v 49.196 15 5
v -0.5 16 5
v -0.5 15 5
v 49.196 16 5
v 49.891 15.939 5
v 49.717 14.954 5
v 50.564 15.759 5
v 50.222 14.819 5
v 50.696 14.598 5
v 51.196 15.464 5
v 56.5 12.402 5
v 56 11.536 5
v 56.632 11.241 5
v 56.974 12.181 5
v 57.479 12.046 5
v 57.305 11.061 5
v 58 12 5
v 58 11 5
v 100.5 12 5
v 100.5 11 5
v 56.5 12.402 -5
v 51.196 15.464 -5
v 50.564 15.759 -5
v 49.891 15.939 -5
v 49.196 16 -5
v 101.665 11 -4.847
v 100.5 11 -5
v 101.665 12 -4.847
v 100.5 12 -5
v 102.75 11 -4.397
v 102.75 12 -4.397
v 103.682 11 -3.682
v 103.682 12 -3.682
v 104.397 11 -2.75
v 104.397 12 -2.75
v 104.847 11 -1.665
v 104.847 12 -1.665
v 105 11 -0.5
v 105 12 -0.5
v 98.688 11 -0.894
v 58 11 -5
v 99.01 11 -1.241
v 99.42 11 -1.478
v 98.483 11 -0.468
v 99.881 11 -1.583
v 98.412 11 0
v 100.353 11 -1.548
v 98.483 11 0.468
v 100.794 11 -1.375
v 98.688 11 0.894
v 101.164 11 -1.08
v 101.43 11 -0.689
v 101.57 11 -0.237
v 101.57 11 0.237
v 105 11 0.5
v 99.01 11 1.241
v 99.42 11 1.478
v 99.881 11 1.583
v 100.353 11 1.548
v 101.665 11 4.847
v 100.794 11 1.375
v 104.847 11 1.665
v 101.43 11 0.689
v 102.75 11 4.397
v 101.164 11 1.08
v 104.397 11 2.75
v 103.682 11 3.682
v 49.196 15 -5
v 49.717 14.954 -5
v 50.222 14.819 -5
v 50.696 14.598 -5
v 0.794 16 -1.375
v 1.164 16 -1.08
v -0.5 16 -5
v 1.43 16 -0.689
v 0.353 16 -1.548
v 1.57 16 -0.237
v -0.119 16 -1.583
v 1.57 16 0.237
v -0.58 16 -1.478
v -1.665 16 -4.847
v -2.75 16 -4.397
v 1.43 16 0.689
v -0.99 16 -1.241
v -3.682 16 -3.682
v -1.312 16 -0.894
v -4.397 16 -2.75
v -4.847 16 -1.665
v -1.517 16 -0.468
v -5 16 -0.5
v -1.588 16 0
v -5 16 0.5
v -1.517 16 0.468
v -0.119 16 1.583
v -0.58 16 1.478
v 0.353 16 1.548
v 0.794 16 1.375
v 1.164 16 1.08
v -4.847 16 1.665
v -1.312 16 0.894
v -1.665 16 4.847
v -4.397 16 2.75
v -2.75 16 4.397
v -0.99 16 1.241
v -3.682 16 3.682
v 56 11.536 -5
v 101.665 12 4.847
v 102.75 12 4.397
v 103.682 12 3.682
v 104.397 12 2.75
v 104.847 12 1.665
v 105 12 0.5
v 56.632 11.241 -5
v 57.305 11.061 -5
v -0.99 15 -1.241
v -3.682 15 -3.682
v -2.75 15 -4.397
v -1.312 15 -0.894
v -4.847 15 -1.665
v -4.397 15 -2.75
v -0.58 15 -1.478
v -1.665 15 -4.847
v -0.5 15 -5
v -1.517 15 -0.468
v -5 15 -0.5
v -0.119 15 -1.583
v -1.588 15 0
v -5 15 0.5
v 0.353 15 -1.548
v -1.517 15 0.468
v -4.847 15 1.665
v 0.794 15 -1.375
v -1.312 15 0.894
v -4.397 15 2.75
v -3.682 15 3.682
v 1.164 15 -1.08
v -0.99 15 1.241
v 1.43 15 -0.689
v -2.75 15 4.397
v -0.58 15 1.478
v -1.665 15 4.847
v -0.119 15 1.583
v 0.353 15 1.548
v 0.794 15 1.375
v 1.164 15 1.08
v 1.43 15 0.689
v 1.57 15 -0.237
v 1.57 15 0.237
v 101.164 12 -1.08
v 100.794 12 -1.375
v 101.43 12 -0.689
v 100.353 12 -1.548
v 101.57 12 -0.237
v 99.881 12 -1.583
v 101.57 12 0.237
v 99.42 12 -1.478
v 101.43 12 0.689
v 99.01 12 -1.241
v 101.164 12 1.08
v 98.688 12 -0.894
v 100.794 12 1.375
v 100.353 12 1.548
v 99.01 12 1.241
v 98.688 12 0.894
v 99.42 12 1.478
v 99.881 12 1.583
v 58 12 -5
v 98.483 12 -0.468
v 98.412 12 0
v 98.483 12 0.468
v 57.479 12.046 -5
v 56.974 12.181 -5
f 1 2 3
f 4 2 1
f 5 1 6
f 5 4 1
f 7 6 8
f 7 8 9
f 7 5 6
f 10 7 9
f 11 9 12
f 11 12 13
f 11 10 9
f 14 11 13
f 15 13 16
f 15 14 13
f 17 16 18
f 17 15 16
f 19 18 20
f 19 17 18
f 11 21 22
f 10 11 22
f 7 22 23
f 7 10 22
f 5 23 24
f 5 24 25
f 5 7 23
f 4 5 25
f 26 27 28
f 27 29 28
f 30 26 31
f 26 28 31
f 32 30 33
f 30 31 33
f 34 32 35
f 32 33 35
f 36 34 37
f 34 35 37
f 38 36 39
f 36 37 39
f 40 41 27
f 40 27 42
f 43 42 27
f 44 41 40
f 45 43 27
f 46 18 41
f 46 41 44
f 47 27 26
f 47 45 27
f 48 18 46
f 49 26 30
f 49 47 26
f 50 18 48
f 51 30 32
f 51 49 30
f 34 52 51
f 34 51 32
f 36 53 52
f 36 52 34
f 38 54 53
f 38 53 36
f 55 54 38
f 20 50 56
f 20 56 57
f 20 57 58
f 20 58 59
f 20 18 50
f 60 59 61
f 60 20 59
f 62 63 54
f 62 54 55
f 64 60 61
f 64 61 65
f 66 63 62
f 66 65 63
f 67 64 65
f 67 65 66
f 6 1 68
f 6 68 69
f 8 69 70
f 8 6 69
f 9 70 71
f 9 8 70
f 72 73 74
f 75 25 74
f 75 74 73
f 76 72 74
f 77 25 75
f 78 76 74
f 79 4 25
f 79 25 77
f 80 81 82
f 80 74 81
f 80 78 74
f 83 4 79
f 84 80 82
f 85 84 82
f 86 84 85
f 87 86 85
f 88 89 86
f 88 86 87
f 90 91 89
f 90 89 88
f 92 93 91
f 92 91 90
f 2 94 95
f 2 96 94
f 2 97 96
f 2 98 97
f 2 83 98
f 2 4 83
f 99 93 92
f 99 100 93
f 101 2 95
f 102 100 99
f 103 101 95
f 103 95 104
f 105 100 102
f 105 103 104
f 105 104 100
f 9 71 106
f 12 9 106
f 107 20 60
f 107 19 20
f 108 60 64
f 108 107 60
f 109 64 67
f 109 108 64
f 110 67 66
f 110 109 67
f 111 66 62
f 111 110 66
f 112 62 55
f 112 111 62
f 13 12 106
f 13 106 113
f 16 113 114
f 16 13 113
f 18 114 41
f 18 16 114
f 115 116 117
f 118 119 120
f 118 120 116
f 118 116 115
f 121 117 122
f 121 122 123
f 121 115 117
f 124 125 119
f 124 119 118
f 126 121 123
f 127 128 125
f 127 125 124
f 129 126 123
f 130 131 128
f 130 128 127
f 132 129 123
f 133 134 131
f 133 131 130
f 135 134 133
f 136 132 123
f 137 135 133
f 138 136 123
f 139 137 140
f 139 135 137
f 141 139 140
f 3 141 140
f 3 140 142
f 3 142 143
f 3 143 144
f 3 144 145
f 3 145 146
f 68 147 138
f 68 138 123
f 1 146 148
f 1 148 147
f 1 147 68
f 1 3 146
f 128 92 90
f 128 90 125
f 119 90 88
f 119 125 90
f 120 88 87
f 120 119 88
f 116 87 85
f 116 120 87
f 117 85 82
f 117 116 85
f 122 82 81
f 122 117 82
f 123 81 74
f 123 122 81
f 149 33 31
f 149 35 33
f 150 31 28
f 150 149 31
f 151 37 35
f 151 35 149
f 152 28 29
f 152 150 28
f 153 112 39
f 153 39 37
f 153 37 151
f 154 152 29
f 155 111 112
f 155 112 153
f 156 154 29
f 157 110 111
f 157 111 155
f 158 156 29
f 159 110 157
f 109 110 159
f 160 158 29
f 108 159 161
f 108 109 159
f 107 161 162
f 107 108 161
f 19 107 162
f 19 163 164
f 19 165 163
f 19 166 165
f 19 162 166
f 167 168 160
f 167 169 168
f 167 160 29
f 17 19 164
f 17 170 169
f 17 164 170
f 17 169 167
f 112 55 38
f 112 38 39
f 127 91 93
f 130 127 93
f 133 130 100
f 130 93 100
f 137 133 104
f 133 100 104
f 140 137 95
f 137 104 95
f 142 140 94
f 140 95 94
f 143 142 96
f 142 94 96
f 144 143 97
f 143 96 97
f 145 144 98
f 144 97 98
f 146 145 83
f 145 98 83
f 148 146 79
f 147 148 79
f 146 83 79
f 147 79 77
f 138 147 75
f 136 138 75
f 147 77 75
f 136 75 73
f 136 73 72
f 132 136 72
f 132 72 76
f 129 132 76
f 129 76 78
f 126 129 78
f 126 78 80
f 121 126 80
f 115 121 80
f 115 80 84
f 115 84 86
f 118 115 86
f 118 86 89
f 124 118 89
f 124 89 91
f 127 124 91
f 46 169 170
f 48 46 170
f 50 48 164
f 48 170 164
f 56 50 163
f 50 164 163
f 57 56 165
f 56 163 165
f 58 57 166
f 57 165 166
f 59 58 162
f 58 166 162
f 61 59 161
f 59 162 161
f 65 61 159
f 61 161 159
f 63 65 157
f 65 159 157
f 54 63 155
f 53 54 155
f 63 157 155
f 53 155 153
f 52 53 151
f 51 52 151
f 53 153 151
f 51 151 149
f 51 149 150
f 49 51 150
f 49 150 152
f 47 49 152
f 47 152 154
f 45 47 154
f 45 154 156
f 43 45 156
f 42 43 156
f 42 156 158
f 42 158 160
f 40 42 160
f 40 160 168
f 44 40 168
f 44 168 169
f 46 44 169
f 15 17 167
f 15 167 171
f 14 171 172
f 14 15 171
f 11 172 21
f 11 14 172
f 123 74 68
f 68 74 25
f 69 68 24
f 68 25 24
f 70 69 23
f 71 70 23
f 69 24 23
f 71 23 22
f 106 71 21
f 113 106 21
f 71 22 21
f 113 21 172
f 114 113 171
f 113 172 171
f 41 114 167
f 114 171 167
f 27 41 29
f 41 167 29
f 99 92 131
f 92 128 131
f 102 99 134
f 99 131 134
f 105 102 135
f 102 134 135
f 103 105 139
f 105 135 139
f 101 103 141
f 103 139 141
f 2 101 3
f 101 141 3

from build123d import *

# Parameters (mm, degrees)
F1_DEPTH = 5
F3_D     = 3.175
F4_R     = 4.5


with BuildPart() as f1:
    # F0 (on Top) → F1 (new body, symmetric)
    with BuildSketch(Plane.XY):
        with BuildLine():
            Line((-5, 16), (-5, 15))
            Line((-5, 15), (49.196152, 15))
            ThreePointArc((49.196152, 15), (49.97261, 14.897777), (50.696152, 14.598076))
            Line((50.696152, 14.598076), (56, 11.535898))
            ThreePointArc((56, 11.535898), (56.964724, 11.136297), (58, 11))
            Line((58, 11), (105, 11))
            Line((105, 11), (105, 12))
            Line((105, 12), (58, 12))
            ThreePointArc((58, 12), (57.223543, 12.102223), (56.5, 12.401924))
            Line((56.5, 12.401924), (51.196152, 15.464102))
            ThreePointArc((51.196152, 15.464102), (50.231429, 15.863703), (49.196152, 16))
            Line((49.196152, 16), (-5, 16))
        make_face()
    extrude(amount=F1_DEPTH, both=True)

    # F3 (through all)
    with Locations(Plane.XZ):
        with Locations((0, 0), (100, 0)):
            Hole(F3_D / 2)

    # F4
    f4_edges = [f1.edges().sort_by_distance(p)[0] for p in [
        (105, 11.5, 5),
        (105, 11.5, -5),
        (-5, 15.5, 5),
        (-5, 15.5, -5),
    ]]
    fillet(f4_edges, radius=F4_R)


solid = f1.part
